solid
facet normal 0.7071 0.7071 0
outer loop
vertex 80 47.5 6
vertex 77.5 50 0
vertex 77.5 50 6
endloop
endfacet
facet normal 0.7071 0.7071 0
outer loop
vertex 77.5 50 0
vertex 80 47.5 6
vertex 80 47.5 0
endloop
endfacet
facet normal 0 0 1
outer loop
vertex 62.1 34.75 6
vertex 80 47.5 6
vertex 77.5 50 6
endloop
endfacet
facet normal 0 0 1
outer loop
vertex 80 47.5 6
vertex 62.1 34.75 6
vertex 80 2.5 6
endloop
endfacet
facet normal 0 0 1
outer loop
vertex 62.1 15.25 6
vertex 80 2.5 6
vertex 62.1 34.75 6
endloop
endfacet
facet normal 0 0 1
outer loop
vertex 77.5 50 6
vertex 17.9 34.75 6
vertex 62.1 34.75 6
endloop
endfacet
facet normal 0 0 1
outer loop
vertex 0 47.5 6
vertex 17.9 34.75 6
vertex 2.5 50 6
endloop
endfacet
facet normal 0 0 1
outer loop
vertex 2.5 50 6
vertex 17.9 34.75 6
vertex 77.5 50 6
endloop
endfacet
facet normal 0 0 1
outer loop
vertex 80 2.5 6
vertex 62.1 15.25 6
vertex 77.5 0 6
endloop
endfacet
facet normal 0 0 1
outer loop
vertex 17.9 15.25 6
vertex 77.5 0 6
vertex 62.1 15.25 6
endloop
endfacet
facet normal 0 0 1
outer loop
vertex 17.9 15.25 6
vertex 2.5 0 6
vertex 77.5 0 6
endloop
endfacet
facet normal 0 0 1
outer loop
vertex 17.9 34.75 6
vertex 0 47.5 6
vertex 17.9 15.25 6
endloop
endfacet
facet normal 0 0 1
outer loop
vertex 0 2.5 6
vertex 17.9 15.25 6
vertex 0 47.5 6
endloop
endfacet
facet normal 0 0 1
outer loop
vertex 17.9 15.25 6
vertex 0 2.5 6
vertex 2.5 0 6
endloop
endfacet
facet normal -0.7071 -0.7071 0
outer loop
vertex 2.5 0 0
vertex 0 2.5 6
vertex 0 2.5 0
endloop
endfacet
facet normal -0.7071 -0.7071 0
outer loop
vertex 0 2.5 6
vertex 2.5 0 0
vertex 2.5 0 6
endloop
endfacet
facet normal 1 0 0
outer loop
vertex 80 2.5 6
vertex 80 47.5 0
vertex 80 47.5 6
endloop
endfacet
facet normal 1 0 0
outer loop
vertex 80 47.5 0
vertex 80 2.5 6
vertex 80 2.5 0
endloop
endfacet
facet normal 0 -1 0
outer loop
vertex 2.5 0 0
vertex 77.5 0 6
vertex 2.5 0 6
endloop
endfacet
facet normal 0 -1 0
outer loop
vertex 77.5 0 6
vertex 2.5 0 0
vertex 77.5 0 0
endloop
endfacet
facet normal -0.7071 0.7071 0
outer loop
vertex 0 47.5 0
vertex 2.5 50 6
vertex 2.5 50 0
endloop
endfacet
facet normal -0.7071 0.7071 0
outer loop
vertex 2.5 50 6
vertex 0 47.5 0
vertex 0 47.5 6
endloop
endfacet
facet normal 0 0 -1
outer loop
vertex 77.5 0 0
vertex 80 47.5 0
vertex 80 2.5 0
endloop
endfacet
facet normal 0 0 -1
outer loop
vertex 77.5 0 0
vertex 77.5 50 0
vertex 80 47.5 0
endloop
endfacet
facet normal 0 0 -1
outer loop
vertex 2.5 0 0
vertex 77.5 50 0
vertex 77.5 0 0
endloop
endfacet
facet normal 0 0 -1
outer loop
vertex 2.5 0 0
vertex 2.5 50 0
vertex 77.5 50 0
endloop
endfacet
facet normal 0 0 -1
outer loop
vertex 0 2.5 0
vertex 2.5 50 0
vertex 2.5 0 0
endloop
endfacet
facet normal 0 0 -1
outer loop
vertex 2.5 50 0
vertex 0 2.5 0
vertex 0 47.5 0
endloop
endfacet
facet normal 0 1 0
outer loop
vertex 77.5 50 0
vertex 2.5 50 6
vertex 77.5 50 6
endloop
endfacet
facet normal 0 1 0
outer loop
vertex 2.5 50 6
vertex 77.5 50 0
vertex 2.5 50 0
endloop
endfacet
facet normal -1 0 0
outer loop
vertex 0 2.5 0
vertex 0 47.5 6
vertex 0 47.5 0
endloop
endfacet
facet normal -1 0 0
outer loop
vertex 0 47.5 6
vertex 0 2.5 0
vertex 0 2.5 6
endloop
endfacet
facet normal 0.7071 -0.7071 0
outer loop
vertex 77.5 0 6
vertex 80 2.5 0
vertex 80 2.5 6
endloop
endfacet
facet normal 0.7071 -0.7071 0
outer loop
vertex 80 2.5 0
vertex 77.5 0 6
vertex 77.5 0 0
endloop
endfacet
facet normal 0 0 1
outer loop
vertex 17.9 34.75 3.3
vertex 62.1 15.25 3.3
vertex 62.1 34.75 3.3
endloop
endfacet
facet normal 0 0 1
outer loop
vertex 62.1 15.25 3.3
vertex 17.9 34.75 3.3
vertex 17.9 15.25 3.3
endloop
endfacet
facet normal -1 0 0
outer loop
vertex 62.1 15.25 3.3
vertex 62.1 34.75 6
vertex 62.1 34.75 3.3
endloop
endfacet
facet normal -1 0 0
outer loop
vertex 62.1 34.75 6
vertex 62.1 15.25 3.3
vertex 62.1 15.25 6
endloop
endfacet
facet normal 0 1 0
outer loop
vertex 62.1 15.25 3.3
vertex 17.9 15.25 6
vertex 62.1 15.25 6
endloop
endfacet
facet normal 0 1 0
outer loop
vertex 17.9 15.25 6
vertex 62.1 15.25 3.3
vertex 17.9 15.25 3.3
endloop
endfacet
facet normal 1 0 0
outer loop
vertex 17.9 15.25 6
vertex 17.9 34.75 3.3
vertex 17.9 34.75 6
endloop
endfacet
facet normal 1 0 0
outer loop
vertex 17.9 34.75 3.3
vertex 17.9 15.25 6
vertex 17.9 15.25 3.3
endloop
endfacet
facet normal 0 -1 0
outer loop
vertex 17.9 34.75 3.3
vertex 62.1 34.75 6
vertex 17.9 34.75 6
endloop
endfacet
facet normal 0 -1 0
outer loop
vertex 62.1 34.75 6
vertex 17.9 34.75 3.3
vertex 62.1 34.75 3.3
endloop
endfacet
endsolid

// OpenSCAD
$fn = 32;

// ----------------------------------------------------------------------
// Windowed plate: 1 voids, 80 x 50 x 6 mm
// ----------------------------------------------------------------------

// --- parameters (mm) ---
plate_l = 80;             // plate length, X
plate_w = 50;             // plate width, Y
plate_t = 6;              // plate thickness, Z
edge_margin = 10;         // wall from the plate edge to any window
win1_l = 44.2;            // window length
win1_w = 19.5;            // window width
depth_1 = 2.7;            // depth of void 1 (full thickness = through)
corner_c = 2.5;           // corner chamfer of the plate

profile = [[2.5, 0], [77.5, 0], [80, 2.5], [80, 47.5], [77.5, 50], [2.5, 50], [0, 47.5], [0, 2.5]];  // primary outline, 8 points, counter clockwise
void_1 = [[17.9, 15.25], [62.1, 15.25], [62.1, 34.75], [17.9, 34.75]];  // large central window, 4 points

// --- the one profile operation ---
difference() {
  linear_extrude(height = plate_t) polygon(points = profile);
  translate([0, 0, plate_t - depth_1])
    linear_extrude(height = depth_1 + 1) polygon(points = void_1);
}
